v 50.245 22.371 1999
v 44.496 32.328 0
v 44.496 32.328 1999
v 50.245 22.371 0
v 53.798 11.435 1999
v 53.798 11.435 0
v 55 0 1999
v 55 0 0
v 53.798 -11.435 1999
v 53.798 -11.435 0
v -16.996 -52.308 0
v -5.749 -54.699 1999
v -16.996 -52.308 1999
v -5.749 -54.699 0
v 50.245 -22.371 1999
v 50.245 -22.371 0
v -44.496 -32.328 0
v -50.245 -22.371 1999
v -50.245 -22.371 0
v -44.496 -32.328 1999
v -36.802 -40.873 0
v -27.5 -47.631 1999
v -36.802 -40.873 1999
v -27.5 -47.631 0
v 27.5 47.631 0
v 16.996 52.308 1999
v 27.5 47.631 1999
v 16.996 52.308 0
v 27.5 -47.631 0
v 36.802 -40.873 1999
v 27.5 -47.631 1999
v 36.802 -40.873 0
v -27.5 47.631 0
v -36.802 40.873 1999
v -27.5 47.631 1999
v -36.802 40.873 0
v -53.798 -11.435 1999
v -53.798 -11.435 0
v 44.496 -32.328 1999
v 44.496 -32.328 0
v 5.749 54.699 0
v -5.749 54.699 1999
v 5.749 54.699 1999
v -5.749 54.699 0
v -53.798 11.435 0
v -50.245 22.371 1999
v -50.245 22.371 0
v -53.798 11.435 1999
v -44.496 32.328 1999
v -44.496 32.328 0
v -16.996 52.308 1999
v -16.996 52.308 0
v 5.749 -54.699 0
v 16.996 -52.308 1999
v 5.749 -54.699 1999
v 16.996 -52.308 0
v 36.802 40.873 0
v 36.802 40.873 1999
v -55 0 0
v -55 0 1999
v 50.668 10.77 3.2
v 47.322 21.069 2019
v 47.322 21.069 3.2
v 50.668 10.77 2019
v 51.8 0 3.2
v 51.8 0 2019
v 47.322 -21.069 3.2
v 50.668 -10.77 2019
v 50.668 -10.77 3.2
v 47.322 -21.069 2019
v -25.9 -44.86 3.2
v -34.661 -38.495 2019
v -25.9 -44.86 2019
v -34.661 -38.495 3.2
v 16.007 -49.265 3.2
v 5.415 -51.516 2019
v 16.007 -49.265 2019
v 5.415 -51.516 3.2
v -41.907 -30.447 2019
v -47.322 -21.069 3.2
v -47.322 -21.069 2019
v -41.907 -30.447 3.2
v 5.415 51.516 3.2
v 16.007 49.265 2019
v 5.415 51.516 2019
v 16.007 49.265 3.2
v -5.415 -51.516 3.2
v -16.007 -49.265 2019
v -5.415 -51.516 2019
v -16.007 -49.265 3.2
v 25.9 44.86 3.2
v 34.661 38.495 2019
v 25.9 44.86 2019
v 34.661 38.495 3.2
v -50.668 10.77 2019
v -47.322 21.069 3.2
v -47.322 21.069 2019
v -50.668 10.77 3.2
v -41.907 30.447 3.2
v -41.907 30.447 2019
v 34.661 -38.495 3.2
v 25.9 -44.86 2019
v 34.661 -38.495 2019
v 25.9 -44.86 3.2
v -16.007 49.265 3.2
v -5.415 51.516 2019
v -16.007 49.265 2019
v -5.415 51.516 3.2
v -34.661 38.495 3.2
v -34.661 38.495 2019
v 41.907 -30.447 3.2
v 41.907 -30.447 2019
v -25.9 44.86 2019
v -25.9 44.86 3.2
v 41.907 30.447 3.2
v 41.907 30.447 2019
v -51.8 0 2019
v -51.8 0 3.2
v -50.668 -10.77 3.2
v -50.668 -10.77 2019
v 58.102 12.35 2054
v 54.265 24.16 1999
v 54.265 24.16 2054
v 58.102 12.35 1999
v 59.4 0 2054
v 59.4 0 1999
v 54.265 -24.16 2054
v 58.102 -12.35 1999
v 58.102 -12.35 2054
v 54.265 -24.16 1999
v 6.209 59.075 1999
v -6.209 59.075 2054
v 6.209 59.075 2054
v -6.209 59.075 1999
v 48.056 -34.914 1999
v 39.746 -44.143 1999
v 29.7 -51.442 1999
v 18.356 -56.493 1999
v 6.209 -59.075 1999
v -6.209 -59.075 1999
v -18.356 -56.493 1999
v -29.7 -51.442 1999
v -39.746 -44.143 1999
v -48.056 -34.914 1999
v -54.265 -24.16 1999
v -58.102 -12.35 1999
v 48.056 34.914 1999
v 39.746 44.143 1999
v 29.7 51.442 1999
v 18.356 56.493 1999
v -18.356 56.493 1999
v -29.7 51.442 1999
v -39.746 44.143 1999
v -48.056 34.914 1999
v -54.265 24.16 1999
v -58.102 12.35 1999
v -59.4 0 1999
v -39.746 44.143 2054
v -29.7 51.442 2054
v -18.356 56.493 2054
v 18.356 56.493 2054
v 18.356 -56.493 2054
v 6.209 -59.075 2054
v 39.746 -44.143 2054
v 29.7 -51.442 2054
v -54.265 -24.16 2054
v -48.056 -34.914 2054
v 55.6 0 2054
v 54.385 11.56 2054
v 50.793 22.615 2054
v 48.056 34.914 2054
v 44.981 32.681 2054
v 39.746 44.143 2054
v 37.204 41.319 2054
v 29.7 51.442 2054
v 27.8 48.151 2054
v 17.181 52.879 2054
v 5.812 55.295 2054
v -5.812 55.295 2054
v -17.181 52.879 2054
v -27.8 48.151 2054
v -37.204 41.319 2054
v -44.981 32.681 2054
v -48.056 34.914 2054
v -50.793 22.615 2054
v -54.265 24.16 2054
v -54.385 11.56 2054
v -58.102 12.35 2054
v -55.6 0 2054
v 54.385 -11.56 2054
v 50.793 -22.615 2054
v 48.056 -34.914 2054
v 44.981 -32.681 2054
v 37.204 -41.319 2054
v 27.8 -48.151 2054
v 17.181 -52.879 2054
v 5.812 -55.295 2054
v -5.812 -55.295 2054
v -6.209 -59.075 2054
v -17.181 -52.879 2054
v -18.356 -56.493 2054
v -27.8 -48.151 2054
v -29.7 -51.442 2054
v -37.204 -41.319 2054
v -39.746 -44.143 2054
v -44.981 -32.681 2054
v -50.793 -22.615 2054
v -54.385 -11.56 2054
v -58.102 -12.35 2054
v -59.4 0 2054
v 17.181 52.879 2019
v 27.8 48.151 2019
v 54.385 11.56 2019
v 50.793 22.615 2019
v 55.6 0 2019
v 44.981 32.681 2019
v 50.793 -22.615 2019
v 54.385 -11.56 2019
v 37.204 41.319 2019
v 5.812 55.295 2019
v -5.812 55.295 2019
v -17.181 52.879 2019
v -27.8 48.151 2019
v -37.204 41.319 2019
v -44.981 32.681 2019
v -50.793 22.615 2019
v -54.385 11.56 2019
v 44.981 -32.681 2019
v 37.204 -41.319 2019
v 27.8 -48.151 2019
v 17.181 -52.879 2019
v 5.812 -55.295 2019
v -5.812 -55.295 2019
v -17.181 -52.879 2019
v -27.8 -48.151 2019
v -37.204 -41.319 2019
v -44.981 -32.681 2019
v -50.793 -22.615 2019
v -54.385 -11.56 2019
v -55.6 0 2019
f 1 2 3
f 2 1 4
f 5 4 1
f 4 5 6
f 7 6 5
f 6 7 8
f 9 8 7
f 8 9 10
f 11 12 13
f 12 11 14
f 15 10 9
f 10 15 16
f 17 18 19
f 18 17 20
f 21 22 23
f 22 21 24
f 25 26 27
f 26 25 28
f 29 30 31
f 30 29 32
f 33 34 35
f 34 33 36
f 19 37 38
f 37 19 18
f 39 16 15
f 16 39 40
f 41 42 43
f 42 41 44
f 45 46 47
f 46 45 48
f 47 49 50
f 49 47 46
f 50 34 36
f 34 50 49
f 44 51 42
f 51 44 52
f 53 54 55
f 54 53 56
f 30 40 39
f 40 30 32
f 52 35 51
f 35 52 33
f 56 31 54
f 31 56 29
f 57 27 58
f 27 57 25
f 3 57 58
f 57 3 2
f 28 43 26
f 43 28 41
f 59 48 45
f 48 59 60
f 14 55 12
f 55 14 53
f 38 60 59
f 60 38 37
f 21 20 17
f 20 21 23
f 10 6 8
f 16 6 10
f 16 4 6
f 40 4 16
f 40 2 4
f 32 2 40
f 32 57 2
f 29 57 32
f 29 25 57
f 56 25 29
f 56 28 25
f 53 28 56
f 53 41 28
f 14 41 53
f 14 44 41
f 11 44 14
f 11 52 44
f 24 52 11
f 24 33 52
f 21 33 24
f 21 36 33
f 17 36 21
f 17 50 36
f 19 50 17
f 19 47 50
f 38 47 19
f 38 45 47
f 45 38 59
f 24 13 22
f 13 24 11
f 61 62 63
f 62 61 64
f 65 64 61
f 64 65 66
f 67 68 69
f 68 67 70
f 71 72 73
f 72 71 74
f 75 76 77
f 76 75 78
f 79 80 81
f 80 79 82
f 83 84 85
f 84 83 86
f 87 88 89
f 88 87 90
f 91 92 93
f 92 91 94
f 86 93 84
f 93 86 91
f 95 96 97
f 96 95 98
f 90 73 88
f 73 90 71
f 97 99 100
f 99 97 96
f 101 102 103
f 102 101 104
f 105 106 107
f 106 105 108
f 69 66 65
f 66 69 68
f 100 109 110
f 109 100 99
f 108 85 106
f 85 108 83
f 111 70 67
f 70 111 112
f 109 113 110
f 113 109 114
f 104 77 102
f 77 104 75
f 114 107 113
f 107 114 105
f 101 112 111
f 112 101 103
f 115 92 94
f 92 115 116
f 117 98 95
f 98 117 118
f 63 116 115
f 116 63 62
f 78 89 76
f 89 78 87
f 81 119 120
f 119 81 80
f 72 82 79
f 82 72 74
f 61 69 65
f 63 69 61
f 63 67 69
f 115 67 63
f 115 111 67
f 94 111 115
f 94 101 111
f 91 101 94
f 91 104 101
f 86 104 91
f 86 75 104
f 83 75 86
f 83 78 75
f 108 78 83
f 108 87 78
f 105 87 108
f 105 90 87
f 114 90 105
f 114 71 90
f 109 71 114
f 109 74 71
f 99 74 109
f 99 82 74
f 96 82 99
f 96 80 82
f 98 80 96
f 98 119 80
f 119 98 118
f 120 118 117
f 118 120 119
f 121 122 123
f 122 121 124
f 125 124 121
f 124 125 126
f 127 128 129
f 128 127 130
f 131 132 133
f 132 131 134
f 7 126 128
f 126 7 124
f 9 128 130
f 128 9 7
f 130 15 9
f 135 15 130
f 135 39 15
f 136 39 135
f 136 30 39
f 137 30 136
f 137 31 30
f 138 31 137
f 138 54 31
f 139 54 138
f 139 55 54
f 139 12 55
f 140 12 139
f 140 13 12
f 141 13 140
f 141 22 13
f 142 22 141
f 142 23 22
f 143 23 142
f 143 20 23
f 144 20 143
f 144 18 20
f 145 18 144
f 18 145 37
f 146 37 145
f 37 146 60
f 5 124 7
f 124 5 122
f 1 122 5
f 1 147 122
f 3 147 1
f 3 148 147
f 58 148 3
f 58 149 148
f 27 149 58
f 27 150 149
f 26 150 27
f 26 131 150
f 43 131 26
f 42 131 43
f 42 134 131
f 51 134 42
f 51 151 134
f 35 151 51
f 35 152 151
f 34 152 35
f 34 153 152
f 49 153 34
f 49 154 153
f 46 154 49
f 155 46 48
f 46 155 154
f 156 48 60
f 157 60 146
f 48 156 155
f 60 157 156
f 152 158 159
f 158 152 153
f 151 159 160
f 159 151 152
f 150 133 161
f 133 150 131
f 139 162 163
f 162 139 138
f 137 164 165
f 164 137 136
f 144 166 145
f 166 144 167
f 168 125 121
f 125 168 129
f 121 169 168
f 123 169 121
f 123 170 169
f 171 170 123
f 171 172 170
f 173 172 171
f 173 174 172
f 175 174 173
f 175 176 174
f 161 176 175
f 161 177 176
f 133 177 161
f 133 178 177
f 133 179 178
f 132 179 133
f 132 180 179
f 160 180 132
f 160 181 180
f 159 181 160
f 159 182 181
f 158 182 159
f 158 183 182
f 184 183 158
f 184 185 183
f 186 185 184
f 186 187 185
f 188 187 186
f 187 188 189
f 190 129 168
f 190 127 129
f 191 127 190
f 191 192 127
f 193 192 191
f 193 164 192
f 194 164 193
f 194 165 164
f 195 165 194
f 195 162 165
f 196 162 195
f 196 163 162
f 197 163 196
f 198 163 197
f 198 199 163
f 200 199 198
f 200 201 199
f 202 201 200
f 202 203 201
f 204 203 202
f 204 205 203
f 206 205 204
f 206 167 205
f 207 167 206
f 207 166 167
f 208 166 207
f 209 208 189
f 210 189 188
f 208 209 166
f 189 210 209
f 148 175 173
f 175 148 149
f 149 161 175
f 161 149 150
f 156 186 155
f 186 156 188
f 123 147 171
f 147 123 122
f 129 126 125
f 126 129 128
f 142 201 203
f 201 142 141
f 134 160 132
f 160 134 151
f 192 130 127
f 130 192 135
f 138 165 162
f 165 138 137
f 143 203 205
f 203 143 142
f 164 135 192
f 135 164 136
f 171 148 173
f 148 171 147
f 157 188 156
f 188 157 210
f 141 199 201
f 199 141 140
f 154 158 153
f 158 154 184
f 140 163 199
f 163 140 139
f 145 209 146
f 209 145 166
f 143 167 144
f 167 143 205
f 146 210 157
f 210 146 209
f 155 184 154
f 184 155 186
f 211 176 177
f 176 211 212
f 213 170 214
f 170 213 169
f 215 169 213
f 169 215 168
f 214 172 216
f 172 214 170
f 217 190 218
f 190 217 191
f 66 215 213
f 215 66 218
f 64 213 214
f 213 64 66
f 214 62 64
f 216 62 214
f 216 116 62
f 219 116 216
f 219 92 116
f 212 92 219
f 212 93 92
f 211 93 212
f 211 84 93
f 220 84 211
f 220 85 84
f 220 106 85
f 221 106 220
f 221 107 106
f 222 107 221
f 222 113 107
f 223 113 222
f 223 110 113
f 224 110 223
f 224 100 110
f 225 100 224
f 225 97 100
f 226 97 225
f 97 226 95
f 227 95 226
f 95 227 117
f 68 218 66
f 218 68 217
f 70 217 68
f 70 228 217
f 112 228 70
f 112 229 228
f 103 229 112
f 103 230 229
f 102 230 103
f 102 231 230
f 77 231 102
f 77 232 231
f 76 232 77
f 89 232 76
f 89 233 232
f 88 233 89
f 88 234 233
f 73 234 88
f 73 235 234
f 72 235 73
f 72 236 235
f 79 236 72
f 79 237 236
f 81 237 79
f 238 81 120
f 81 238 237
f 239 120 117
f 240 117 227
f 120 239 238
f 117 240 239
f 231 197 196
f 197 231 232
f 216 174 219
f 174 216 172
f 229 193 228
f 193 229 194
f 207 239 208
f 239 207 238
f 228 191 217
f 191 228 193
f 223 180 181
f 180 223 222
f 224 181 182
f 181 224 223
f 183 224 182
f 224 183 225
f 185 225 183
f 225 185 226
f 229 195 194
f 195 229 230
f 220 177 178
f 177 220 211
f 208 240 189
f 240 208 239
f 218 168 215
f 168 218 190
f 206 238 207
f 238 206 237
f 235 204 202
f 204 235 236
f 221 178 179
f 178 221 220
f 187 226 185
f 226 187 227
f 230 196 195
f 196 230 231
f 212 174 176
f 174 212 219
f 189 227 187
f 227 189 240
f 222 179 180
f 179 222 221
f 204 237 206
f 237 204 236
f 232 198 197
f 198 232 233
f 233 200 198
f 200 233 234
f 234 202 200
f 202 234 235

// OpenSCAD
// Parameters
nominal_size = 110; //[50:200:1]
length_mm = 2000; //[1000:4000:10]
pipe_od = 110; //[55:220:1]
pipe_wall = 3.2; //[1.6:6.4:0.1]
fitting_length = 55; //[25:110:1]
fitting_od_scale = 1.08; //[1.02:1.2:0.01]
fitting_wall_scale = 1.25; //[1.0:1.8:0.05]
socket_depth = 35; //[15:70:1]
socket_clearance = 0.6; //[0.2:1.5:0.1]
connect_overlap = 1; //[0.5:2:0.1]

// HT Pipe - complete geometry
module ht_pipe() {
  color([0.85, 0.85, 0.8]) {
    // Pipe body
    difference() {
      cylinder(r=pipe_od/2, h=length_mm, center=false);
      translate([0, 0, pipe_wall])
        cylinder(r=pipe_od/2 - pipe_wall, h=length_mm, center=false);
    }
    
    // End fitting
    translate([0, 0, length_mm - connect_overlap]) {
      difference() {
        cylinder(r=(pipe_od * fitting_od_scale) / 2, h=fitting_length, center=false);
        cylinder(r=pipe_od/2 - pipe_wall, h=fitting_length + connect_overlap, center=false);
        translate([0, 0, fitting_length - socket_depth])
          cylinder(r=pipe_od/2 + socket_clearance, h=socket_depth, center=false);
      }
    }
  }
}

// Assembly
module assembly() {
  ht_pipe();
}

assembly();
